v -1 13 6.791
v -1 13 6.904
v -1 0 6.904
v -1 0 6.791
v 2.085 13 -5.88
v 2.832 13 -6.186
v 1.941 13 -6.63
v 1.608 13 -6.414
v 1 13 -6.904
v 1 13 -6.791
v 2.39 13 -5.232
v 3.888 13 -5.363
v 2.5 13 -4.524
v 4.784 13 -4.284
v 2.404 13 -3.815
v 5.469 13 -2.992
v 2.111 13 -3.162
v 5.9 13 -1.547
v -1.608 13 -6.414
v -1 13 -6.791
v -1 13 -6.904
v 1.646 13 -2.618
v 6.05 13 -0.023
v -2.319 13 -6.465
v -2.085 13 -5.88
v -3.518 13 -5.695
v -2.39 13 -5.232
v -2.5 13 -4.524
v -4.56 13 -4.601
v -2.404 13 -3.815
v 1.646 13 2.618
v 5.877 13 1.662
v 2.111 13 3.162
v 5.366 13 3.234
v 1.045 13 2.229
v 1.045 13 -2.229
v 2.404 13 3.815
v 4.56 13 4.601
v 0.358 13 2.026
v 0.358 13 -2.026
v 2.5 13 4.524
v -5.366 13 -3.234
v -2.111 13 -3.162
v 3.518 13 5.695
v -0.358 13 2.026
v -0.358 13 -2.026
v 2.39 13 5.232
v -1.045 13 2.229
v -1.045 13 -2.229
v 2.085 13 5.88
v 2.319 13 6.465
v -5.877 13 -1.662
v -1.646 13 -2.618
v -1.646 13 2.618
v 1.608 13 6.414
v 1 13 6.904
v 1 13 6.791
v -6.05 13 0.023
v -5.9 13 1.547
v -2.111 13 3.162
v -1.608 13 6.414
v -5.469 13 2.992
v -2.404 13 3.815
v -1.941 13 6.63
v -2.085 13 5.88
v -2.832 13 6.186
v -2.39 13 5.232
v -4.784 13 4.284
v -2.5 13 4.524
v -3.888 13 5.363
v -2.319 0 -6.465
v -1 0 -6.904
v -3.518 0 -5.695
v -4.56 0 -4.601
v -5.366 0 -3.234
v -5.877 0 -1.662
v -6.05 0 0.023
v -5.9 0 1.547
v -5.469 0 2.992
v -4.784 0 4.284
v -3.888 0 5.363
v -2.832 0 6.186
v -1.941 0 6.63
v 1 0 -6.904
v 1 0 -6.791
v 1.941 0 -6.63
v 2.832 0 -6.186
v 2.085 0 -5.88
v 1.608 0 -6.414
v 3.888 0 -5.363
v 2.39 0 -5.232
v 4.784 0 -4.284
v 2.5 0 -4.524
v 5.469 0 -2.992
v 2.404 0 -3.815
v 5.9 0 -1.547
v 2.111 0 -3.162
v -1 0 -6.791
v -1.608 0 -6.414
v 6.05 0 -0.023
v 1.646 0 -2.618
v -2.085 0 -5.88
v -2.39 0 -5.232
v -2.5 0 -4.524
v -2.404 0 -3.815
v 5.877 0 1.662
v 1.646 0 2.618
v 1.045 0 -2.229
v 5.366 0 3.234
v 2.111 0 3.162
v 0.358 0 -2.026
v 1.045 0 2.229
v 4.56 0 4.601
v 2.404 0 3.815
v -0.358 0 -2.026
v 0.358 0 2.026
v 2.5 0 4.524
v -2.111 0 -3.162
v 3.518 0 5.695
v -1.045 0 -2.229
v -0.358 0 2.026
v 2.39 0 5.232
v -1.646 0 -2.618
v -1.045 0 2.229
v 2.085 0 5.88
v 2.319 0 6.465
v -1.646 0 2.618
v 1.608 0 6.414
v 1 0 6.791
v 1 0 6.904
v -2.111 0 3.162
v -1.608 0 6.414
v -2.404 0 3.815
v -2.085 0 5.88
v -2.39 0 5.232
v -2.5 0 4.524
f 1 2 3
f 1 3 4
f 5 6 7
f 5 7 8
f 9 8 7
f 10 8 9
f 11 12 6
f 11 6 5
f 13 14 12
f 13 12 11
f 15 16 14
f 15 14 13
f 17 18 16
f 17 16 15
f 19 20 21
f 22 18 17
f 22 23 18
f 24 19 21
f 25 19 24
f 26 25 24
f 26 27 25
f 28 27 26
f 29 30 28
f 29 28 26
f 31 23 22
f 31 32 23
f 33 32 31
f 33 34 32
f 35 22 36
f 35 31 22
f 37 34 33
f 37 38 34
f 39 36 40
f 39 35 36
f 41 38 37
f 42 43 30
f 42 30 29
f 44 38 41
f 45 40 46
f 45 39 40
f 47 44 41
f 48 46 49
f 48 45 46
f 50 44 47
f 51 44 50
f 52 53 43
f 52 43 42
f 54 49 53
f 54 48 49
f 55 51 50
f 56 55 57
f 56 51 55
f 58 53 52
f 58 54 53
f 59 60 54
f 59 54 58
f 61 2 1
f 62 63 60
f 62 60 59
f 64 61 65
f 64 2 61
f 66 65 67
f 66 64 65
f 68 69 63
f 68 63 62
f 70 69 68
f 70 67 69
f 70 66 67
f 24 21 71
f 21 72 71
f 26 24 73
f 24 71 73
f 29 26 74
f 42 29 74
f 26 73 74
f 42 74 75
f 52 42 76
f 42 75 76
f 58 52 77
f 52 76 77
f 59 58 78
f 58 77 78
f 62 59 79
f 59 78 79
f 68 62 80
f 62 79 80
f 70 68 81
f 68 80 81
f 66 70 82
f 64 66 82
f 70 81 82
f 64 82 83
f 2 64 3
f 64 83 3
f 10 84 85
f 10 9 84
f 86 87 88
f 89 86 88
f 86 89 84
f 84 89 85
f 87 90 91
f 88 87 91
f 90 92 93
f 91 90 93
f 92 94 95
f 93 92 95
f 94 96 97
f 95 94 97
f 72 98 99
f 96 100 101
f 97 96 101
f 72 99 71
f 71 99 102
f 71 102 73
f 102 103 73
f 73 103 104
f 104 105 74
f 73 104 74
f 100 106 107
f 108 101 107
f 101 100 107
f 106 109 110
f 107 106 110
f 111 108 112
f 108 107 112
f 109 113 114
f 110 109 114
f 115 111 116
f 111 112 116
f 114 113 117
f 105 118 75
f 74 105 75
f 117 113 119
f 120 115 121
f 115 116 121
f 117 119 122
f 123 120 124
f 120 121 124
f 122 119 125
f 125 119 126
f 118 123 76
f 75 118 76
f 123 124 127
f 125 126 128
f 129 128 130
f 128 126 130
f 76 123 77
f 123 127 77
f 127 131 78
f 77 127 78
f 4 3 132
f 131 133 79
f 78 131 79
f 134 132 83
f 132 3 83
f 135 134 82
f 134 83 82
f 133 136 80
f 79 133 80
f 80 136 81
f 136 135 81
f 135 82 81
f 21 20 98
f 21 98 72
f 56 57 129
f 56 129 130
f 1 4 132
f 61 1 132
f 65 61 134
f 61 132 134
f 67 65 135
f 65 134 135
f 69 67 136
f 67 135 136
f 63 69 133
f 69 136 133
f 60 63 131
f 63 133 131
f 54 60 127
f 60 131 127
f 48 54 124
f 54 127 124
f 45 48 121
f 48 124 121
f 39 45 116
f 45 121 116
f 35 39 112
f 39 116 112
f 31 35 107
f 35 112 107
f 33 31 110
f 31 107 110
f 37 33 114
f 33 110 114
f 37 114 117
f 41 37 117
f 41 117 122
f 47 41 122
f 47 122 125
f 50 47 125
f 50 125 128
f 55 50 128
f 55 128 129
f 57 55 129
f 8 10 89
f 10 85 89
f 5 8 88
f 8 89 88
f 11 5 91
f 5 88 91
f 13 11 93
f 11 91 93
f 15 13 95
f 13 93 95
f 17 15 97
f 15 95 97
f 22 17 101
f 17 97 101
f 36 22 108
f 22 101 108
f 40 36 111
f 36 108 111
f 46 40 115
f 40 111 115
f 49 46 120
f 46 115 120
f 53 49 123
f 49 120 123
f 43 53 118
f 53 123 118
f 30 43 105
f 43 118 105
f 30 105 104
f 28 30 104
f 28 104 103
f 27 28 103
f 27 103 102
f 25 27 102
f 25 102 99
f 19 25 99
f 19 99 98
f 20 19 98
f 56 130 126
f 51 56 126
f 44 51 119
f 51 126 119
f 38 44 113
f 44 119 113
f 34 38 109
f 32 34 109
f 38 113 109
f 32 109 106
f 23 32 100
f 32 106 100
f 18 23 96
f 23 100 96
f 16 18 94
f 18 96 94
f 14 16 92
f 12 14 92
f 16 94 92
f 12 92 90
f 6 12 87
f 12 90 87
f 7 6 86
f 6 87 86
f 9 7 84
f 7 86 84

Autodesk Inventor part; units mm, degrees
ref_plane "YZ Plane" through (0, 0, 0) normal (1, 0, 0) x (0, 1, 0)
ref_plane "XZ Plane" through (0, 0, 0) normal (0, 1, 0) x (-1, 0, 0)
ref_plane "XY Plane" through (0, 0, 0) normal (0, 0, 1) x (1, 0, 0)
sketch "Boceto1" plane through (0, 0, 0) normal (0, 1, 0) x (-1, 0, 0)
  ellipse E0 centre (0, 0) end of major axis (0, 7) minor radius 6.05
  circle A0 centre (0, -4.5) radius 2.5
  circle A1 centre (0, 4.5) radius 2.5
  point P0 (0, 7)
  point P1 (0, -7)
  dimension "d0" = 7
  dimension "d1" = 6.05
  dimension "d6" = 5
  dimension "d7" = 5
extrude "Extrusión1" add sketch "Boceto1" along normal blind 13
sketch "Boceto2" plane through (0, 13, 4.5) normal (0, 1, 0) x (1, 0, 0)
  line L0 (-1, -2) -> (1, -2)
  line L1 (1, -2) -> (1, -4)
  line L2 (1, -4) -> (-1, -4)
  line L3 (-1, -4) -> (-1, -2)
  circle A0 centre (0, 0) radius 2.5 projected
  point P0 (0, 4.5)
  point P1 (0, -2.5)
  dimension "d8" = 2
  dimension "d9" = 1
  dimension "d11" = 2
  dimension "d12" = 2
extrude "Extrusión2" cut sketch "Boceto2" against normal blind 13 contours L0 L1 A0 L3 | A0 L1 L2 L3 picked at (0, -2.1667)
sketch "Boceto4" plane through (0, 13, 0) normal (0, 1, 0) x (1, 0, 0)
  line L0 (-1, 8) -> (1, 8)
  line L1 (1, 8) -> (1, 4.3137)
  line L2 (1, 4.3137) -> (-1, 4.3137)
  line L3 (-1, 4.3137) -> (-1, 8)
  point P0 (0, 0)
  dimension "d15" = 2
  dimension "d16" = 4.3137
  dimension "d17" = 8
  dimension "d18" = 1
extrude "Extrusión3" cut sketch "Boceto4" against normal blind 13
equation "\"d7\" = d6"
equation "\"d9\" = 0.5 * d12"
equation "\"d18\" = 0.5 * d15"
properties part number "Relleno_chumacera" material "Plástico PC/ABS"
